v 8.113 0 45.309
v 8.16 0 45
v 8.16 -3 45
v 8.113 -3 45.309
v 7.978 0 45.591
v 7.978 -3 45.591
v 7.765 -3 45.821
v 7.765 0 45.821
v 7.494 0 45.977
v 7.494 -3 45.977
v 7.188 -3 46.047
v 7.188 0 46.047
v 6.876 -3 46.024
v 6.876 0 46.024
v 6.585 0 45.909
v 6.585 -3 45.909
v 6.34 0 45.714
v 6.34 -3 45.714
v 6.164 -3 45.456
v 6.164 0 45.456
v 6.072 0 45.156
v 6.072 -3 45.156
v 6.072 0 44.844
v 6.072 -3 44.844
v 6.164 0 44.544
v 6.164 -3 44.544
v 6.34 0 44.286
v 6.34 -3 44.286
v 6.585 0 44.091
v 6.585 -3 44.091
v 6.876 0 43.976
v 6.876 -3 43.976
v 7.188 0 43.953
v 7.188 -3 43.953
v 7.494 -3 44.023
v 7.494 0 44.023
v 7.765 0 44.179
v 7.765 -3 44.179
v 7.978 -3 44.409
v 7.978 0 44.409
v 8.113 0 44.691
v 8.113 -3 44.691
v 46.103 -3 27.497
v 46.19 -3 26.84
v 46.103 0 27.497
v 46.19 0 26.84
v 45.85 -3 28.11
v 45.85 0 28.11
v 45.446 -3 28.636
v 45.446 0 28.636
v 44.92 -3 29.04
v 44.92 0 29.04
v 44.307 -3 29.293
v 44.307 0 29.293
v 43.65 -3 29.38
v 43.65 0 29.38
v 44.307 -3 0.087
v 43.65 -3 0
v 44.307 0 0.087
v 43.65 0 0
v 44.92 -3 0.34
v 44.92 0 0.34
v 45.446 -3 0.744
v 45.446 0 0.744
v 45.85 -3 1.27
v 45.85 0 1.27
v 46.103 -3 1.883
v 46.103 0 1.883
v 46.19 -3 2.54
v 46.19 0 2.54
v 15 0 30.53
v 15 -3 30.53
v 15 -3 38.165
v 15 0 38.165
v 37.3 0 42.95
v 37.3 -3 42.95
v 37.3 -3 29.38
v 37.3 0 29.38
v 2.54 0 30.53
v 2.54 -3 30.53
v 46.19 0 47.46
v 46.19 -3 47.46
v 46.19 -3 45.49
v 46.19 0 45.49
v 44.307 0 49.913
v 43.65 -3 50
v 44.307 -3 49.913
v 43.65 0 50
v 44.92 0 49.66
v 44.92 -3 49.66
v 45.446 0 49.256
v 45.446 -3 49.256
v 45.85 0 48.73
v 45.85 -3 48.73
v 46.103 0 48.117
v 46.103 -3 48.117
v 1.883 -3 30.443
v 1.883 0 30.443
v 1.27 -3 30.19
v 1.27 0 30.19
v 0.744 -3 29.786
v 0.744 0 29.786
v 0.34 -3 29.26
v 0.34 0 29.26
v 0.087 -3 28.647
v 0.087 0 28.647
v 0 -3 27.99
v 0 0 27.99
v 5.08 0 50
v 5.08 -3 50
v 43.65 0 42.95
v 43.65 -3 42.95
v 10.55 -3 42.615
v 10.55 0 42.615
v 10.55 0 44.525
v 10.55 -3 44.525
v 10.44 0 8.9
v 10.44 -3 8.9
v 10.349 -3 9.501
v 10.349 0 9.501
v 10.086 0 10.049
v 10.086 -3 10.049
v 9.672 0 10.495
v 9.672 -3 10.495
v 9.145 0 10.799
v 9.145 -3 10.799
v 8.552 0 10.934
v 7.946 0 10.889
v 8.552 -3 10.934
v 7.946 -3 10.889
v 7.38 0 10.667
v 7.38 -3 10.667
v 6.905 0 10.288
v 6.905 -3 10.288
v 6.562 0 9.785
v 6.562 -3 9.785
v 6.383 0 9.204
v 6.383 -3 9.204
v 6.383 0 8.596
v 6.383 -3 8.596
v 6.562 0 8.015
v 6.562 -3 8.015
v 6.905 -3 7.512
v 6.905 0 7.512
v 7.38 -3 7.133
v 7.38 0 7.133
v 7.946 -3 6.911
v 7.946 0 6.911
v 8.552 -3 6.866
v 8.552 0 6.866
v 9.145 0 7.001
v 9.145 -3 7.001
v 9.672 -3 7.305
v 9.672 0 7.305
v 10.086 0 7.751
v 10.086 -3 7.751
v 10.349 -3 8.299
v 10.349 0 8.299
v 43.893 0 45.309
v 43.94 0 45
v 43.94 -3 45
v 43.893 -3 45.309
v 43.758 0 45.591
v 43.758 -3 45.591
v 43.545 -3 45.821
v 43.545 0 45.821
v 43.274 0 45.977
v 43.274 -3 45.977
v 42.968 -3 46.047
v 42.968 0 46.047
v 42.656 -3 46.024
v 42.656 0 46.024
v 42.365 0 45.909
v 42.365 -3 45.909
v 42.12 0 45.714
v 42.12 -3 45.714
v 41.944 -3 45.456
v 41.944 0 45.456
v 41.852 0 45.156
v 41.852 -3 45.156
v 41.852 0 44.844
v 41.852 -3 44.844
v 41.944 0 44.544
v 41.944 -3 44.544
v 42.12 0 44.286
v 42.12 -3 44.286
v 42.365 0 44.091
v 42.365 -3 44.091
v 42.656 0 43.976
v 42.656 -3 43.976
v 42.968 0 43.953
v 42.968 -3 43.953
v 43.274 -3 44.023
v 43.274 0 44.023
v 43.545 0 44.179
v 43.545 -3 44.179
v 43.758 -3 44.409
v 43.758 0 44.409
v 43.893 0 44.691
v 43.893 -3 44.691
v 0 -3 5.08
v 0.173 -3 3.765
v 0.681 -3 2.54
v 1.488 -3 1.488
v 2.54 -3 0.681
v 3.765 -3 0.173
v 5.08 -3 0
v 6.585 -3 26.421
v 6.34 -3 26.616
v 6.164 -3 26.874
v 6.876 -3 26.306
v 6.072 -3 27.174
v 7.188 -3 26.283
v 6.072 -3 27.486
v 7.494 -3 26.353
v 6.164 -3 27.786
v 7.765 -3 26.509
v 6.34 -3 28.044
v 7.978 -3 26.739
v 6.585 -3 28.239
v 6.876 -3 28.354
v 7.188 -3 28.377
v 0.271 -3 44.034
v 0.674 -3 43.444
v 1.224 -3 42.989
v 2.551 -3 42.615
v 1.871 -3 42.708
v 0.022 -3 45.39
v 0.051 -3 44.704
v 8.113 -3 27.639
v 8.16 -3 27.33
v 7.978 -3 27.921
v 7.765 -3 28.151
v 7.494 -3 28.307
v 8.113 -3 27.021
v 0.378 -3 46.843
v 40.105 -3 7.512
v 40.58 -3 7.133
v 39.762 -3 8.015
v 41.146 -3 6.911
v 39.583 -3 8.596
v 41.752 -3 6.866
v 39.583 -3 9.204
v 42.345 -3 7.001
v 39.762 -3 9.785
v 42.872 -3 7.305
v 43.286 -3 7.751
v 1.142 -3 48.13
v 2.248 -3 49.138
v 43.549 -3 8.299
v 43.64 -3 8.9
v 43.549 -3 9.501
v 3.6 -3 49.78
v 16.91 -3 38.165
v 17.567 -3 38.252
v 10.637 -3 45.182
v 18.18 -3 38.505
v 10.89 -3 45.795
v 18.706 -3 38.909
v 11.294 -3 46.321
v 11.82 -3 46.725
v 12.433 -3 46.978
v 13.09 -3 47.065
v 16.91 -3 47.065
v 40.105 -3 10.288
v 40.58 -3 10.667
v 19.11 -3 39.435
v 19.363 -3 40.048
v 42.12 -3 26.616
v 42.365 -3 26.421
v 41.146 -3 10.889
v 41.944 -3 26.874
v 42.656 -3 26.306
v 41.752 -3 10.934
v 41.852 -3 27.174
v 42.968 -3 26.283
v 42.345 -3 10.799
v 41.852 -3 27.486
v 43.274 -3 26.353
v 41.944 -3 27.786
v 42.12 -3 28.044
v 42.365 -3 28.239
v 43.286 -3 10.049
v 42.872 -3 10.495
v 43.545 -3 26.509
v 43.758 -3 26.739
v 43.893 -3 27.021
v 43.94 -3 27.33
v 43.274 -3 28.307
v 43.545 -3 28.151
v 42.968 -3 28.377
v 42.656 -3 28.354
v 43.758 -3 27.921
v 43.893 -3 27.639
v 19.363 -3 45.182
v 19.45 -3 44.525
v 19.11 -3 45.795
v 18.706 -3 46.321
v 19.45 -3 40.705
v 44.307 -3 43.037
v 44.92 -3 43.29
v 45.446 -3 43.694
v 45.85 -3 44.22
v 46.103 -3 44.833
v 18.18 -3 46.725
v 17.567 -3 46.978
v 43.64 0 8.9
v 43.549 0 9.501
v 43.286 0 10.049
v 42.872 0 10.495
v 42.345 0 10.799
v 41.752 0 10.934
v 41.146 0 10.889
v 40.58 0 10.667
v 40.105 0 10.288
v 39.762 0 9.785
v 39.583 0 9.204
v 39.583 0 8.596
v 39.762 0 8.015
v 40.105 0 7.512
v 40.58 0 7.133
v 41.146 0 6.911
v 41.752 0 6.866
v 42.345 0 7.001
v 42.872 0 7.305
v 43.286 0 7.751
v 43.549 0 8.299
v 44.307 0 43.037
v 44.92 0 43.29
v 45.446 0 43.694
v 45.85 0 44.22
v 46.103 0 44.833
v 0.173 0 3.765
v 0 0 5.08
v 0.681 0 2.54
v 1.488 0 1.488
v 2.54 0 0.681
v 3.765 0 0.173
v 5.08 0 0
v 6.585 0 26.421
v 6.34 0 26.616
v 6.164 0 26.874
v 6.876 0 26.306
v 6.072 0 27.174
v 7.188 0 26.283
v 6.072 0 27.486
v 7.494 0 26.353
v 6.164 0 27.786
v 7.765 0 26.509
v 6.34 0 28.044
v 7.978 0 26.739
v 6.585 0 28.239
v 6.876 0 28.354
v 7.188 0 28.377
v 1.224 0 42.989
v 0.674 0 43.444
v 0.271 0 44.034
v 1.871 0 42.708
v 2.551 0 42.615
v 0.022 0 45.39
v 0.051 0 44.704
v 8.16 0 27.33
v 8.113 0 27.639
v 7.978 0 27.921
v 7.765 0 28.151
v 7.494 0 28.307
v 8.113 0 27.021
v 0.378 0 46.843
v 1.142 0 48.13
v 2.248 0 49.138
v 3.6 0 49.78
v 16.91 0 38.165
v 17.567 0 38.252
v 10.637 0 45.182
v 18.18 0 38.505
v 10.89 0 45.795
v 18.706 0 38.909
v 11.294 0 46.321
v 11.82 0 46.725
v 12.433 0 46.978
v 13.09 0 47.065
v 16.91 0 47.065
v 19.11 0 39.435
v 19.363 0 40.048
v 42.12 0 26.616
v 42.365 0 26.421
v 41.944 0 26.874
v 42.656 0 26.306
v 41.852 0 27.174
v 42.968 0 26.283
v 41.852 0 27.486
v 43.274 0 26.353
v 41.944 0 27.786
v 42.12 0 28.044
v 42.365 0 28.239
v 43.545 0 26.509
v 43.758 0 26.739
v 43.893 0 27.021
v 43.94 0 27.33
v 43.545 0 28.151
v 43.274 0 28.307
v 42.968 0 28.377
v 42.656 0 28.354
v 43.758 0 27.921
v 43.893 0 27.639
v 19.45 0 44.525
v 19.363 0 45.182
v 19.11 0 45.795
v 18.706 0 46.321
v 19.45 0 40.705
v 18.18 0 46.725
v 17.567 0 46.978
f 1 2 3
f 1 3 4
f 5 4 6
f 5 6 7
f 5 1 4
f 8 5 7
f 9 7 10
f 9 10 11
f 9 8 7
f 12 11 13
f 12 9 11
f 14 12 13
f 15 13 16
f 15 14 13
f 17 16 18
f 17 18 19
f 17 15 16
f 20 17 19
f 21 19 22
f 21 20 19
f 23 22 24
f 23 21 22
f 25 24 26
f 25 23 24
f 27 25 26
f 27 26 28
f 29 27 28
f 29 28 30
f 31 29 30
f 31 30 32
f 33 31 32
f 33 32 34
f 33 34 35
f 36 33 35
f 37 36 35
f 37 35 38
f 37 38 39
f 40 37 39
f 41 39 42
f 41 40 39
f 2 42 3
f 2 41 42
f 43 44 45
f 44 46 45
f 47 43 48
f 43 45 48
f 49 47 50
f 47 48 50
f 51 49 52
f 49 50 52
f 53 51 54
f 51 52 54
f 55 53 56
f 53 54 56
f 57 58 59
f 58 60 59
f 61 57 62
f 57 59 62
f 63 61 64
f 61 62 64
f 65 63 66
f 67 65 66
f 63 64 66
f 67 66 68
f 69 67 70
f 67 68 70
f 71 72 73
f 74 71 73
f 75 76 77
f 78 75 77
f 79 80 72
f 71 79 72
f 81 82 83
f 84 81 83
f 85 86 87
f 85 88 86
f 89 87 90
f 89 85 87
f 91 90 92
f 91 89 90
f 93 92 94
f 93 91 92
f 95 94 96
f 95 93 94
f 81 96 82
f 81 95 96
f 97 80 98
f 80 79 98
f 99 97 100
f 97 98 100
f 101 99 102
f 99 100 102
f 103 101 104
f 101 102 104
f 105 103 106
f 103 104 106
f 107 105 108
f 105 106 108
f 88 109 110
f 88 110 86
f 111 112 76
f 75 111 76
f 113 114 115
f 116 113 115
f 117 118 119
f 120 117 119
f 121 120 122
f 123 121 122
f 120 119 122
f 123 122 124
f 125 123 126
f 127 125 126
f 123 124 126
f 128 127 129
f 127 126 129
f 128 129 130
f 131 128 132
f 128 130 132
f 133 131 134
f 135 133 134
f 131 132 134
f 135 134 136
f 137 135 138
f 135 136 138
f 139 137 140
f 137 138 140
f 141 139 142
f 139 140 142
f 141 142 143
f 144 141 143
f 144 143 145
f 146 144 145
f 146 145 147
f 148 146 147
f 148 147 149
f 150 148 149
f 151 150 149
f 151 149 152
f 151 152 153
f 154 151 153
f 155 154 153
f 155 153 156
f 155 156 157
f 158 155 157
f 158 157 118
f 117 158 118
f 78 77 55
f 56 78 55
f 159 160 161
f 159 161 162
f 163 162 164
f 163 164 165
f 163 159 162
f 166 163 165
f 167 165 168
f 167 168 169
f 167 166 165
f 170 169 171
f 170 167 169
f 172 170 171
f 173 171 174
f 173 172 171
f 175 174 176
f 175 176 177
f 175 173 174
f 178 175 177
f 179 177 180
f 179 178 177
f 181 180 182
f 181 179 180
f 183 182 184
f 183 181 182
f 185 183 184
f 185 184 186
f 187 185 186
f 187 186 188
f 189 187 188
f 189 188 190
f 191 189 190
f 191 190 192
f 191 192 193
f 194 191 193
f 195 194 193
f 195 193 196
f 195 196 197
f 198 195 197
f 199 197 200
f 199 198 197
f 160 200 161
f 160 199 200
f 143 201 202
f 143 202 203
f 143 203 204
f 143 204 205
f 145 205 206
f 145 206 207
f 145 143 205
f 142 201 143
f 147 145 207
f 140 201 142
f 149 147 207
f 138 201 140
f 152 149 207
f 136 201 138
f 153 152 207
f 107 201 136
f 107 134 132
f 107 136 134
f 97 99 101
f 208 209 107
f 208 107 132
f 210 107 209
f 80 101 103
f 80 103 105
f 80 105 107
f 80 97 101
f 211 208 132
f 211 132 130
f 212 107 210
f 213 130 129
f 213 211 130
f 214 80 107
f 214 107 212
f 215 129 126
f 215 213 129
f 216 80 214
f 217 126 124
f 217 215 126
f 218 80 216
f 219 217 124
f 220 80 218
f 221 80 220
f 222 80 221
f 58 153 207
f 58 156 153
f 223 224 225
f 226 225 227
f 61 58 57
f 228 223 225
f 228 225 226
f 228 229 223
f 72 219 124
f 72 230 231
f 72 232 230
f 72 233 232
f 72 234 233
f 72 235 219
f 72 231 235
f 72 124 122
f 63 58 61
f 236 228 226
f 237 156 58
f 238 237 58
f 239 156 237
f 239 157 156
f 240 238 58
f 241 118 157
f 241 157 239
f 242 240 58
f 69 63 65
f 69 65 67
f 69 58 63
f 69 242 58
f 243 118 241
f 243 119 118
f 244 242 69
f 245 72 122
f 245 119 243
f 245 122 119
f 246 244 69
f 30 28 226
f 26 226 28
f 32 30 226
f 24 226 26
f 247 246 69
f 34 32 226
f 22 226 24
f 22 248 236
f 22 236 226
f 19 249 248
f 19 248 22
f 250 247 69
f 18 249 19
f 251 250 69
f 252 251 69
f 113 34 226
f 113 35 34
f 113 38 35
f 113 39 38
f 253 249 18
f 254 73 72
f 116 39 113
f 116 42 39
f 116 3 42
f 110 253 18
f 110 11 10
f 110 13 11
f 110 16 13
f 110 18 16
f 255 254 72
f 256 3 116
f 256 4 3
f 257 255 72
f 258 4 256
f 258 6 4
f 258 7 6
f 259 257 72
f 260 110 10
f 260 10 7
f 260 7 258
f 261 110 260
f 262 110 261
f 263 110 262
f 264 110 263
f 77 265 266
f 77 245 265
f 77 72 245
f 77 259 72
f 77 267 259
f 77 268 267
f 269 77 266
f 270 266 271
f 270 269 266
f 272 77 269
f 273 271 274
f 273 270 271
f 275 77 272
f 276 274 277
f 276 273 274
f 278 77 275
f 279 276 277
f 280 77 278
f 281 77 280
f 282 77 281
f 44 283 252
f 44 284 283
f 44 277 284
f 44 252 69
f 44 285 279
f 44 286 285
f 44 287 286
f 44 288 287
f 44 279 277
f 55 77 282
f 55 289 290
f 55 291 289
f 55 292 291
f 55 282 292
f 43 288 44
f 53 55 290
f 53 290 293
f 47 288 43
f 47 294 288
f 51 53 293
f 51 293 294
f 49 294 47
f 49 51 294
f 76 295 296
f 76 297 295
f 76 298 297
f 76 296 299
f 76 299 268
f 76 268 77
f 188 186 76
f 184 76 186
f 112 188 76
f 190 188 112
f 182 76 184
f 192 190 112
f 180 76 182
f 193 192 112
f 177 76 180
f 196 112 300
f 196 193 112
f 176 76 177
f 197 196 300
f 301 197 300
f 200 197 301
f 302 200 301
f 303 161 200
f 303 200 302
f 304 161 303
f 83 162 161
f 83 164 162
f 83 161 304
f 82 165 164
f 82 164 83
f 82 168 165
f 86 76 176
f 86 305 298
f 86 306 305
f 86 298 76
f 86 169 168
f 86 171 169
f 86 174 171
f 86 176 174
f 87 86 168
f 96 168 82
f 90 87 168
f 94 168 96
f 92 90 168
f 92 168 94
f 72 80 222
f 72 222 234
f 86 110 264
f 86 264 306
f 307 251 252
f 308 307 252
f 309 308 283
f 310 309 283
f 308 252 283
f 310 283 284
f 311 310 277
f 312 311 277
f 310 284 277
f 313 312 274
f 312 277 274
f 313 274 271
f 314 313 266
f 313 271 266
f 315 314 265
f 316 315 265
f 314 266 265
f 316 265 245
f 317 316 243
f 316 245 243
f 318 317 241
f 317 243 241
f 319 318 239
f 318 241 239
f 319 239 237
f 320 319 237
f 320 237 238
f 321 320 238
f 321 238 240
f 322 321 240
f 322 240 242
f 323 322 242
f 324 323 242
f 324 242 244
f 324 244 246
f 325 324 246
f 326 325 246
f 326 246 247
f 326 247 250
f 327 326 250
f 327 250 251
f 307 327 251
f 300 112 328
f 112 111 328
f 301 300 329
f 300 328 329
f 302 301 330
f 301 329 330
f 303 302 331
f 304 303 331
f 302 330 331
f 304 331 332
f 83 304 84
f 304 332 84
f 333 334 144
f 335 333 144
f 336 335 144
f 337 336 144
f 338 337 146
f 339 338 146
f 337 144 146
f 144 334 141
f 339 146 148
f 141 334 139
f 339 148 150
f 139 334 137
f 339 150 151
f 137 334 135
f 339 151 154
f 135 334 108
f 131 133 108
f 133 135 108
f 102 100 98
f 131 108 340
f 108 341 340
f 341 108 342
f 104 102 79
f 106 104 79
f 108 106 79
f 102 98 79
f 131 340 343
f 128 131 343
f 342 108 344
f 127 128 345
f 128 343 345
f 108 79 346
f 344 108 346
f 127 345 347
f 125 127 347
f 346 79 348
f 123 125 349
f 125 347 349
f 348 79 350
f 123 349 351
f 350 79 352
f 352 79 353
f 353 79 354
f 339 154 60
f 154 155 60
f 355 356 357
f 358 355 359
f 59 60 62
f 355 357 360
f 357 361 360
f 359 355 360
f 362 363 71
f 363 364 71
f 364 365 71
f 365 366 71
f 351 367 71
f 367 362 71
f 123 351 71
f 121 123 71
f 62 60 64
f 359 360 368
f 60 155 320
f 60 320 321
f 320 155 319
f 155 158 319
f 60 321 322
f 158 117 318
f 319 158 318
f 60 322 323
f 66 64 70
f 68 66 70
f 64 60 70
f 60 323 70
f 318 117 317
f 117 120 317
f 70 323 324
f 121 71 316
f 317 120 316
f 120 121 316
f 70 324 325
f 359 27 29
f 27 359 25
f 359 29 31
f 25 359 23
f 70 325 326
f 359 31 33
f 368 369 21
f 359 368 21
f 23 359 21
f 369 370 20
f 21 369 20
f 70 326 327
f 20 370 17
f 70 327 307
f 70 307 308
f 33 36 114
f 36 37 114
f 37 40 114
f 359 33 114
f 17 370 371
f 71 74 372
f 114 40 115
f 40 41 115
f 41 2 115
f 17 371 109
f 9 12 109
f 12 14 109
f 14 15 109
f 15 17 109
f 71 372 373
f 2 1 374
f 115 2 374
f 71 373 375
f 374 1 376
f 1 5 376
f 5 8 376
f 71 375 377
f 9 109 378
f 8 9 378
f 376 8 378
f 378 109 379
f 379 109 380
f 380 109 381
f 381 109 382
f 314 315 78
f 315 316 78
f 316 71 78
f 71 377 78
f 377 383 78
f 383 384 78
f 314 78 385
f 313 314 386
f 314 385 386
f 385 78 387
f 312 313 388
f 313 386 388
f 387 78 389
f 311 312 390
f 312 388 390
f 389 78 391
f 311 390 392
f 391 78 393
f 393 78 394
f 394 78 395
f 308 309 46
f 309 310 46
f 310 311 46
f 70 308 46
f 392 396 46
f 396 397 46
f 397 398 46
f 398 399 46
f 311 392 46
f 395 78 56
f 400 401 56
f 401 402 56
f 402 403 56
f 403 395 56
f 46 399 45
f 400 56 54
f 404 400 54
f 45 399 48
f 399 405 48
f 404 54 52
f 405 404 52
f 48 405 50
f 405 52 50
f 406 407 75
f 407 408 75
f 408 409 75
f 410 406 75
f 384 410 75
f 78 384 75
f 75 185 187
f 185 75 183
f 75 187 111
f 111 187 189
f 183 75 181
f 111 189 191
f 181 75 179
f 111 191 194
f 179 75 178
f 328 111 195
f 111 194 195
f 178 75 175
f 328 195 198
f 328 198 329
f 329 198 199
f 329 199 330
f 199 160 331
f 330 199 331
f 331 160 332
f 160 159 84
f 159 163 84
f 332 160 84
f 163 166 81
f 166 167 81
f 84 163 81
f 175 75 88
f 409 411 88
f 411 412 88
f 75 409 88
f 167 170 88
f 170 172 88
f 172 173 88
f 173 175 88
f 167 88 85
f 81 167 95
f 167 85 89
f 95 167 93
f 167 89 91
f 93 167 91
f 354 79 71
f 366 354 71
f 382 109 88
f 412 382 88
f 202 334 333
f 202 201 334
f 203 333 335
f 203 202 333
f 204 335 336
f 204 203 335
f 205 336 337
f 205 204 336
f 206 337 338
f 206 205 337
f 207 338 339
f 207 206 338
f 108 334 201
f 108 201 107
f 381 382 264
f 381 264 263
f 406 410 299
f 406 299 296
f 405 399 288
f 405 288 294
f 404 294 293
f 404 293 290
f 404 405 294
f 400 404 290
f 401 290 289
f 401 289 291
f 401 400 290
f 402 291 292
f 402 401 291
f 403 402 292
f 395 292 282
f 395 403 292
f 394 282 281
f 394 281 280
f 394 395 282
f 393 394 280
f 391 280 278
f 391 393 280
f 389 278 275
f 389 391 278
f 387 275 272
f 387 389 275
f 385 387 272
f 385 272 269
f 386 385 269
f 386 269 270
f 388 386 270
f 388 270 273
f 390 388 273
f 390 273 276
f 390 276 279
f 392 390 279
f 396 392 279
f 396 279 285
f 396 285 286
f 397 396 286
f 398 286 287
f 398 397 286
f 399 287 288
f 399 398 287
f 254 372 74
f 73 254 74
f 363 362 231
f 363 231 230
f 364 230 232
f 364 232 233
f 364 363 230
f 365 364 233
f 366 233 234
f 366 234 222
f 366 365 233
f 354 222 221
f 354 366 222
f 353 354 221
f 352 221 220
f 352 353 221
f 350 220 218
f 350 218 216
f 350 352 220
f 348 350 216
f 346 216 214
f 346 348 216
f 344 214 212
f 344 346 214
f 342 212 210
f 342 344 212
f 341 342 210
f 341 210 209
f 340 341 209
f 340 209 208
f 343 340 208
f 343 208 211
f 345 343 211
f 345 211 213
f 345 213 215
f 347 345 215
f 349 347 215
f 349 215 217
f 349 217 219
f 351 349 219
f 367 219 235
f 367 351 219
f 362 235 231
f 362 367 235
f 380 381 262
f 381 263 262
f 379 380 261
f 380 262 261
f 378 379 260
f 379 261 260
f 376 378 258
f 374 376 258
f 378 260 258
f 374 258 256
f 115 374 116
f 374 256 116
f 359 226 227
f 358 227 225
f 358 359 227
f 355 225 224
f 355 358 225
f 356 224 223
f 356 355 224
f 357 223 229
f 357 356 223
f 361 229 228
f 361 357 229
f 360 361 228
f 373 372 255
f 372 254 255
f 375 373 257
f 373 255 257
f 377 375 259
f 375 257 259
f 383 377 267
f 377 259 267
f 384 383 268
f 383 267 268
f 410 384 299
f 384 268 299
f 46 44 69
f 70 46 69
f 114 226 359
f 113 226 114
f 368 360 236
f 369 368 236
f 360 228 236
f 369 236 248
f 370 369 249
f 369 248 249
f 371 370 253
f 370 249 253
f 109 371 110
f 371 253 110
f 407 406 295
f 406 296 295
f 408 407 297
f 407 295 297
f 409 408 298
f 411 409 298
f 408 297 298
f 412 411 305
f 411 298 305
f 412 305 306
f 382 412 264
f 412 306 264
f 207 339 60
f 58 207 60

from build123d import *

# Parameters (mm, degrees)
F0_W     = 50
F0_H     = 50
F0_R     = 1.05
F1_DEPTH = 3
F2_W     = 15
F2_H     = 12.085
F3_DEPTH = 3.001
F4_R     = 2.04
F5_DEPTH = 3.001
F7_DEPTH = 3.001
F8_W     = 8.9
F8_H     = 8.9
F9_DEPTH = 3.001
F10_R    = 5.08
F11_R    = 2.54
F12_R    = 2.54


with BuildPart() as f1:
    # F0 (on Front) → F1 (new body)
    with BuildSketch(Plane.XZ):
        with Locations((25, 25)):
            Rectangle(F0_W, F0_H)
        with Locations((7.11, 27.33)):
            Circle(F0_R, mode=Mode.SUBTRACT)
        with Locations((7.11, 45)):
            Circle(F0_R, mode=Mode.SUBTRACT)
        with Locations((42.89, 27.33)):
            Circle(F0_R, mode=Mode.SUBTRACT)
        with Locations((42.89, 45)):
            Circle(F0_R, mode=Mode.SUBTRACT)
    extrude(amount=F1_DEPTH)

    # F2 (on face) → F3 (cut, through all)
    with BuildSketch(Plane.XZ.offset(3)):
        with Locations((7.5, 36.5725)):
            Rectangle(F2_W, F2_H)
    extrude(amount=-F3_DEPTH, mode=Mode.SUBTRACT)

    # F4 (on face) → F5 (cut, through all)
    with BuildSketch(Plane.XZ.offset(3)):
        with Locations((8.4, 8.9)):
            Circle(F4_R)
        with Locations((41.6, 8.9)):
            Circle(F4_R)
    extrude(amount=-F5_DEPTH, mode=Mode.SUBTRACT)

    # F6 (on face) → F7 (cut, through all)
    with BuildSketch(Plane.XZ.offset(3)):
        Polygon((37.3, 29.38), (46.19, 29.38), (46.19, 0), (50, 0), (50, 29.38), (50, 42.95), (50, 50), (46.19, 50), (46.19, 42.95), (37.3, 42.95), align=None)
    extrude(amount=-F7_DEPTH, mode=Mode.SUBTRACT)

    # F8 (on face) → F9 (cut, through all)
    with BuildSketch(Plane(origin=(0, 0, 0), x_dir=(-1, 0, 0), z_dir=(0, 1, 0))):
        with Locations((-15, 42.615)):
            Rectangle(F8_W, F8_H)
    extrude(amount=-F9_DEPTH, mode=Mode.SUBTRACT)

    # F10
    f10_edges = [f1.edges().sort_by_distance(p)[0] for p in [
        (0, -1.5, 50),
        (0, -1.5, 0),
    ]]
    fillet(f10_edges, radius=F10_R)

    # F11
    f11_edges = [f1.edges().sort_by_distance(p)[0] for p in [
        (19.45, -1.5, 47.065),
        (19.45, -1.5, 38.165),
        (10.55, -1.5, 47.065),
    ]]
    fillet(f11_edges, radius=F11_R)

    # F12
    f12_edges = [f1.edges().sort_by_distance(p)[0] for p in [
        (46.19, -1.5, 50),
        (46.19, -1.5, 29.38),
        (46.19, -1.5, 42.95),
        (0, -1.5, 42.615),
        (0, -1.5, 30.53),
        (46.19, -1.5, 0),
    ]]
    fillet(f12_edges, radius=F12_R)


solid = f1.part
